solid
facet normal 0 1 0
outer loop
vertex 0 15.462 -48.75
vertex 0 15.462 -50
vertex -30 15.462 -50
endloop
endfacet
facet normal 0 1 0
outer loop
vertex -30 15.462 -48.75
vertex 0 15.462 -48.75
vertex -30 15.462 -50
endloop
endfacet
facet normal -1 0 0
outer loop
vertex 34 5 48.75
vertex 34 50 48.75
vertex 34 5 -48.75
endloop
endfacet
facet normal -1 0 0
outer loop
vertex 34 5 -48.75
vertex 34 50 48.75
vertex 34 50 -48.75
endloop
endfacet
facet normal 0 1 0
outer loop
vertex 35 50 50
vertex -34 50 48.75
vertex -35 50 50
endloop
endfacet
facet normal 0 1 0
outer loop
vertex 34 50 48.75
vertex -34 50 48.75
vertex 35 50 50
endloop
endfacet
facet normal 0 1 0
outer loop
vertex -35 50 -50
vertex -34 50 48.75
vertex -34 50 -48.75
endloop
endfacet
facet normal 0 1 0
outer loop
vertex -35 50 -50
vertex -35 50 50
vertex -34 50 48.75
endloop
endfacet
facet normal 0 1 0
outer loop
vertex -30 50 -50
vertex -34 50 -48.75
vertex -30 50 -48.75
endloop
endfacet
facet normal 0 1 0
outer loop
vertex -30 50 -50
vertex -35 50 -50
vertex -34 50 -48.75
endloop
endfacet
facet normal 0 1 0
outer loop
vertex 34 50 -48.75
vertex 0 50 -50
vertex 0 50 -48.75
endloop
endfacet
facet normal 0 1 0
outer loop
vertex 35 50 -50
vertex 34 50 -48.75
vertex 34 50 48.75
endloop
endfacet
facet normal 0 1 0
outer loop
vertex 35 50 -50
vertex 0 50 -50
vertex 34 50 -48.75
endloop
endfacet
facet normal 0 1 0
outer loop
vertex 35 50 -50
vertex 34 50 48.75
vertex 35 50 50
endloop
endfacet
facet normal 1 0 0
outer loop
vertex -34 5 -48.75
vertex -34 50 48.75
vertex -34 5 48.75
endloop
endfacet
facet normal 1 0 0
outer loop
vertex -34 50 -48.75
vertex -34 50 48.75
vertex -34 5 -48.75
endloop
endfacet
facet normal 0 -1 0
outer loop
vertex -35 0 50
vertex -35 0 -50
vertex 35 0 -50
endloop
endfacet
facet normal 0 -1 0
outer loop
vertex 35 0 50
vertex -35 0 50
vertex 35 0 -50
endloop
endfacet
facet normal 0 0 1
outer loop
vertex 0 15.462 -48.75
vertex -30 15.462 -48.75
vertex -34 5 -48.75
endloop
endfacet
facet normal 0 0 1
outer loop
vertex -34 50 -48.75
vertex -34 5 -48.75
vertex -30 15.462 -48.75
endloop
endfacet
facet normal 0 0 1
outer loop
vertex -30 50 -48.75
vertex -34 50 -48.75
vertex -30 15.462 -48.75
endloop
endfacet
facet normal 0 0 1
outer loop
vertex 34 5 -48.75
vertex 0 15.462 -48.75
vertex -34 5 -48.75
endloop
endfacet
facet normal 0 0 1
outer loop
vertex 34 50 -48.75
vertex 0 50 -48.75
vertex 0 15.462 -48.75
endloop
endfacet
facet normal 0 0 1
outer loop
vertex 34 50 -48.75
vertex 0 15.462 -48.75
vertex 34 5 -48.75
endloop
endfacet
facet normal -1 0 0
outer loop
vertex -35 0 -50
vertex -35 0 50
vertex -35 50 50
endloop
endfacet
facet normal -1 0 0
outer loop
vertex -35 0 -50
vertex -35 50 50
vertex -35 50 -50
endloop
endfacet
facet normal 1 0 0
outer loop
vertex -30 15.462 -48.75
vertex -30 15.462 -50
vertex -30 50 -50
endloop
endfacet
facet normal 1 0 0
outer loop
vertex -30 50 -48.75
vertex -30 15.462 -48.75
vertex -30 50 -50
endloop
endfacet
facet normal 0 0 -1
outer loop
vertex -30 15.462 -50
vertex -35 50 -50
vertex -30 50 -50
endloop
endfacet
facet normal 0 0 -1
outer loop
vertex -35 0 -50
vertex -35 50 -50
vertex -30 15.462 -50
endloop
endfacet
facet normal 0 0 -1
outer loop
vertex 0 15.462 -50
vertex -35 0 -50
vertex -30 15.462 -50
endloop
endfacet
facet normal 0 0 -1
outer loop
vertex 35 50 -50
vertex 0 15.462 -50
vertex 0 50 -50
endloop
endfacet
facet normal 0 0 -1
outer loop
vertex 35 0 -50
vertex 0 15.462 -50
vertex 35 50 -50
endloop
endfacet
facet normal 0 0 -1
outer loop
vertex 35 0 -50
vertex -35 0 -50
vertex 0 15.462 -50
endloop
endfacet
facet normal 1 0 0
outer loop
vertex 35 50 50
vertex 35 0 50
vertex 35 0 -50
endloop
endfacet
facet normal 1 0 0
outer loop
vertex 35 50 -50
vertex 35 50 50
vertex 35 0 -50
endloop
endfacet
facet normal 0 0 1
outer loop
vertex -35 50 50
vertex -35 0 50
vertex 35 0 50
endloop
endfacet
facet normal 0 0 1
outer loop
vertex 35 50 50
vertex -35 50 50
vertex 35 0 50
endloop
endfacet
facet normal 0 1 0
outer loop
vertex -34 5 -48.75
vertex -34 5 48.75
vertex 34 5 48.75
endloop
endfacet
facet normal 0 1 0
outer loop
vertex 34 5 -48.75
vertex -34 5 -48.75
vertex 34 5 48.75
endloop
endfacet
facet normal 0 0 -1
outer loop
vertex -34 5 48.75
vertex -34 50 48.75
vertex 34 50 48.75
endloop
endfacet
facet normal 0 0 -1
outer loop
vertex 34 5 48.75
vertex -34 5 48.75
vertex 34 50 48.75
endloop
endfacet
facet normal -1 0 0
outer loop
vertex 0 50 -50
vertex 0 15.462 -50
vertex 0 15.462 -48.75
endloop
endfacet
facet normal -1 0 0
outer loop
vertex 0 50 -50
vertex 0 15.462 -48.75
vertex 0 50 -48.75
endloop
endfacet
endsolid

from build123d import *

# Parameters (mm, degrees)
SKETCH1_W           = 70
SKETCH1_H           = 100
BOSS_EXTRUDE1_DEPTH = 50
SKETCH3_W           = 68
SKETCH3_H           = 97.5
CUT_EXTRUDE1_DEPTH  = 45
SKETCH5_W           = 30
SKETCH5_H           = 40
CUT_EXTRUDE2_DEPTH  = 5.5


with BuildPart() as part:
    # Sketch1 → Boss-Extrude1 (new body)
    with BuildSketch(Plane(origin=(0, 0, 0), x_dir=(1, 0, 0), z_dir=(0, 1, 0))):
        Rectangle(SKETCH1_W, SKETCH1_H)
    extrude(amount=BOSS_EXTRUDE1_DEPTH)

    # Sketch3 → Cut-Extrude1 (cut)
    with BuildSketch(Plane(origin=(0, 50, 0), x_dir=(1, 0, 0), z_dir=(0, 1, 0))):
        Rectangle(SKETCH3_W, SKETCH3_H)
    extrude(amount=-CUT_EXTRUDE1_DEPTH, mode=Mode.SUBTRACT)

    # Sketch5 → Cut-Extrude2 (cut)
    with BuildSketch(Plane(origin=(0, 0, -50), x_dir=(-1, 0, 0), z_dir=(0, 0, -1))):
        with Locations((15, 35.461610705)):
            Rectangle(SKETCH5_W, SKETCH5_H)
    extrude(amount=-CUT_EXTRUDE2_DEPTH, mode=Mode.SUBTRACT)


solid = part.part
